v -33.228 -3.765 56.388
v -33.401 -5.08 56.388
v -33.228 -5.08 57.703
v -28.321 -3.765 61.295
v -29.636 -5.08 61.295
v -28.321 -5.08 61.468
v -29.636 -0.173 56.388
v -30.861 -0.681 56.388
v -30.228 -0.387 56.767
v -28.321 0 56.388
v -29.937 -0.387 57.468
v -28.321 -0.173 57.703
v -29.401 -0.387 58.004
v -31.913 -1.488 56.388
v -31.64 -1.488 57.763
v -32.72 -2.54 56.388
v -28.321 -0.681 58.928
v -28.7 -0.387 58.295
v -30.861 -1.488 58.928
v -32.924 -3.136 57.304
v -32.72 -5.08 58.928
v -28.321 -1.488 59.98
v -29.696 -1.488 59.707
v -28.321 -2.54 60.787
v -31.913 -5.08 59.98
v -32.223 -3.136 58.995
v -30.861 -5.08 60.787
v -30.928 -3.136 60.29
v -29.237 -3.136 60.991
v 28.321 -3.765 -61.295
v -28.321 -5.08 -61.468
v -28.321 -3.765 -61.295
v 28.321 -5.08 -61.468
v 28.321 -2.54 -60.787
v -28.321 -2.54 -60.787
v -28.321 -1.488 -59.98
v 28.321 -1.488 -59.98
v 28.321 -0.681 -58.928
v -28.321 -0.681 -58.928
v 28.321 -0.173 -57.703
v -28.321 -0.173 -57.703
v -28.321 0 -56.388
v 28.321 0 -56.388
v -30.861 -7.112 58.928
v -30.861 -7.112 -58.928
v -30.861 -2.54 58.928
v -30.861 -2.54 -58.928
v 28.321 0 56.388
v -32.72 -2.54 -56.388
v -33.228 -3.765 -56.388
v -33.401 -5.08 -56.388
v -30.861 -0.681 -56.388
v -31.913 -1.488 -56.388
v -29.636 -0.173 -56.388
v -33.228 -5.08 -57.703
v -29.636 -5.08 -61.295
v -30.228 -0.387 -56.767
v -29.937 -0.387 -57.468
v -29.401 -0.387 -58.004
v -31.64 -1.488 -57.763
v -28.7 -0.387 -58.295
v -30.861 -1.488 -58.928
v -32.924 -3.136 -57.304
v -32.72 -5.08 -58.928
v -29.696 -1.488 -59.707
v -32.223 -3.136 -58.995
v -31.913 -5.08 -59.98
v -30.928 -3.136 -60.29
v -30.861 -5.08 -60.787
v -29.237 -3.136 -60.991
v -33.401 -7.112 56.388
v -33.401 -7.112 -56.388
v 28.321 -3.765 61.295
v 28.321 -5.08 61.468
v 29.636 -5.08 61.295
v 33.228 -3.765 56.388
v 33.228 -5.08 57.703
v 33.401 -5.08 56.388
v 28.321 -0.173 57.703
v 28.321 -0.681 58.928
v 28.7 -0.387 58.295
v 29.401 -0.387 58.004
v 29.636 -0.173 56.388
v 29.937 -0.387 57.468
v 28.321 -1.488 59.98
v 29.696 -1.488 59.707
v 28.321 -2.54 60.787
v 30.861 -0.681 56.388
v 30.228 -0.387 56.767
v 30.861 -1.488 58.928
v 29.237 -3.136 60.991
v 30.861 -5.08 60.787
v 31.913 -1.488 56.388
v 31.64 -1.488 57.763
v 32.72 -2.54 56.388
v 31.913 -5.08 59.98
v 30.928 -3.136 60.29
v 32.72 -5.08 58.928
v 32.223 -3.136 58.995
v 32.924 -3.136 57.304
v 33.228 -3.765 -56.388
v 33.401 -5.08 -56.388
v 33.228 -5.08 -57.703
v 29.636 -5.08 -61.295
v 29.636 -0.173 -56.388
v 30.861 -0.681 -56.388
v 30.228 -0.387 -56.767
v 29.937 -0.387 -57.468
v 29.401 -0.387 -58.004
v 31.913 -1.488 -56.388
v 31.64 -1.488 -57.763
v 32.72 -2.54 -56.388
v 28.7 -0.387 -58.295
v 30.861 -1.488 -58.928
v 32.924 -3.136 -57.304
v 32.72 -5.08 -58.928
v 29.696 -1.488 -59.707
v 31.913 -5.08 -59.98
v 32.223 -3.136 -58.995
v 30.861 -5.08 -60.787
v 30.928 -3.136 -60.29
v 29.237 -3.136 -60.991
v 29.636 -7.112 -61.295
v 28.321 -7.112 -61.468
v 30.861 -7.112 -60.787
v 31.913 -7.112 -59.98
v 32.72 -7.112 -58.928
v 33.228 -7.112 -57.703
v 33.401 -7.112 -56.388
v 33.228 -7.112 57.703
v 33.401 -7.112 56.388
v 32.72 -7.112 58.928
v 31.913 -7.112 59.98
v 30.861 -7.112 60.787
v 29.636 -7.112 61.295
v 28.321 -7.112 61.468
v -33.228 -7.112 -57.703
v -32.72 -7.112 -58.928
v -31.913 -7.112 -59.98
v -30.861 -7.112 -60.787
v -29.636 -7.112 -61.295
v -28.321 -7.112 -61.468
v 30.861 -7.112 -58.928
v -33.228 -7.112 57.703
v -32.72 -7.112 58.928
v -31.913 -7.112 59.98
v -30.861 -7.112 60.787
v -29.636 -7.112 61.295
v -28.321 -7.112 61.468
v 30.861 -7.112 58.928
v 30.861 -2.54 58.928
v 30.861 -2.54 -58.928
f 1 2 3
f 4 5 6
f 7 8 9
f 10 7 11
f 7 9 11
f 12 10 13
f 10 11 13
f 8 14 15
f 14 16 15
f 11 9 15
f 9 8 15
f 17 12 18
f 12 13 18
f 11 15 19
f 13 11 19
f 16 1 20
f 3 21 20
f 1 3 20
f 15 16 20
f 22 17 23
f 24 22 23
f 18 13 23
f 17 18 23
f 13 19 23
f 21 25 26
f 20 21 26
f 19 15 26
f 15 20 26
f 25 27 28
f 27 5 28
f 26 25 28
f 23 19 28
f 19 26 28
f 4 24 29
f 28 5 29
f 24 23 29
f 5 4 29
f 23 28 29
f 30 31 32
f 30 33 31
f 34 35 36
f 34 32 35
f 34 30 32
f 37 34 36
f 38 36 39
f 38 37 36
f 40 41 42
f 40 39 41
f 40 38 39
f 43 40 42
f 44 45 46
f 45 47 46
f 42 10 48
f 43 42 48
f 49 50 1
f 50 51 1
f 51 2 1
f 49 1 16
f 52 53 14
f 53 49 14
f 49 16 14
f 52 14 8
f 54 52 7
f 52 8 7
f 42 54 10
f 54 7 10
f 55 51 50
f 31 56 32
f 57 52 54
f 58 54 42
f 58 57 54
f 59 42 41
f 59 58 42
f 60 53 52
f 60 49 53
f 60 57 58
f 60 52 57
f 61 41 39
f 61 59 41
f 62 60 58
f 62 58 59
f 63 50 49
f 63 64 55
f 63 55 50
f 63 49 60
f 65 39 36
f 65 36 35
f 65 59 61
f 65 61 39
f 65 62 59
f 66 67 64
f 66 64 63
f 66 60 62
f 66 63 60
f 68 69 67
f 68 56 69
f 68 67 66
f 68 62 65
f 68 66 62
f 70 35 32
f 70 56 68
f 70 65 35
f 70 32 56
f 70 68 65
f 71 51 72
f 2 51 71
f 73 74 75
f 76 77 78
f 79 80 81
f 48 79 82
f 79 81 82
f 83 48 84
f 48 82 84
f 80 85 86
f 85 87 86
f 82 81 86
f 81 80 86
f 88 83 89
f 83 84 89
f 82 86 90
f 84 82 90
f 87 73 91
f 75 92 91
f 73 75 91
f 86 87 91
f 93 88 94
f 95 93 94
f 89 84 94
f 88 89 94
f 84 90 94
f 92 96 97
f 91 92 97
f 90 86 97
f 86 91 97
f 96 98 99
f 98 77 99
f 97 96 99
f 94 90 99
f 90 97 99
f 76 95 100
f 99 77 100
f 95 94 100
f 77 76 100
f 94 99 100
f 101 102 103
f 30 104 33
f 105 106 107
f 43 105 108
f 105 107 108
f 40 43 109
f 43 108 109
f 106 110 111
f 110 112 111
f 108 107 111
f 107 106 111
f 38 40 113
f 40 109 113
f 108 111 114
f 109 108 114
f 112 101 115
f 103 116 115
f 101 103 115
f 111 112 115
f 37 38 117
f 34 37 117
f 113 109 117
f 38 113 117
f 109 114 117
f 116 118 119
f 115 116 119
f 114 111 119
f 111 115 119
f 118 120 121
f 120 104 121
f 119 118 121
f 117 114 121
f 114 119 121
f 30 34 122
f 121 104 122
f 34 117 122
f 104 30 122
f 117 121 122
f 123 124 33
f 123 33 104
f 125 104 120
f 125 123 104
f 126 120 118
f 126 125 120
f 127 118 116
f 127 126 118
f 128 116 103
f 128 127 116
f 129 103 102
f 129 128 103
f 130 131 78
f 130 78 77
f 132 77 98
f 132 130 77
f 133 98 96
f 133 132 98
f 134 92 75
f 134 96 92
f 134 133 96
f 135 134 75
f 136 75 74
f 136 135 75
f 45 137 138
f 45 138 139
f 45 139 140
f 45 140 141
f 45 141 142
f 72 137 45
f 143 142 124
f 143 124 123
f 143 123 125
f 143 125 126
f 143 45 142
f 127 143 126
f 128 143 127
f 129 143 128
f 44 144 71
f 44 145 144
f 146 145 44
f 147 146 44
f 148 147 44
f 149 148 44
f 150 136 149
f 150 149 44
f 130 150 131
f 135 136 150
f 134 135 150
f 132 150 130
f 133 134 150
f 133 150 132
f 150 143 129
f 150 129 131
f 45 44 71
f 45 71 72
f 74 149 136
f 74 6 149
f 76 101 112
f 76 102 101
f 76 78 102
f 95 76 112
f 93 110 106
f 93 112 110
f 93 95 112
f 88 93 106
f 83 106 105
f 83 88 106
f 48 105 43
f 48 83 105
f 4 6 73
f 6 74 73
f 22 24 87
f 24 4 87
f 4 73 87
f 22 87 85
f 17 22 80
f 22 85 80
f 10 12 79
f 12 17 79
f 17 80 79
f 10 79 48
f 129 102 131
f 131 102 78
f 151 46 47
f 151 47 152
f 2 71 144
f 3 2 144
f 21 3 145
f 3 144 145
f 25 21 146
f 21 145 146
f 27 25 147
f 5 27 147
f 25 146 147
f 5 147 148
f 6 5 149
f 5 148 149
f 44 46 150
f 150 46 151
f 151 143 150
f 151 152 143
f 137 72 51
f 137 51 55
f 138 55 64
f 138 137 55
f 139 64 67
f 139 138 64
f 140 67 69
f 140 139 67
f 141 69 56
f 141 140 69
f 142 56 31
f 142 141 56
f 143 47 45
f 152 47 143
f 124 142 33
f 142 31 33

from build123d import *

# Parameters (mm, degrees)
F0_W     = 66.802
F0_H     = 122.936
F1_DEPTH = 7.112
F2_T     = -2.54
F3_R     = 5.08


with BuildPart() as f1:
    # F0 (on Front) → F1 (new body)
    with BuildSketch(Plane.XZ):
        Rectangle(F0_W, F0_H)
    extrude(amount=F1_DEPTH)

    # F2
    f2_openings = [f1.faces().sort_by_distance(p)[0] for p in [
        (0, -7.112, 0),
    ]]
    offset(amount=F2_T, openings=f2_openings)

    # F3
    f3_edges = [f1.edges().sort_by_distance(p)[0] for p in [
        (33.401, -3.556, 61.468),
        (33.401, -3.556, -61.468),
        (-33.401, -3.556, -61.468),
        (-33.401, -3.556, 61.468),
        (-33.401, 0, 0),
        (0, 0, 61.468),
        (33.401, 0, 0),
        (0, 0, -61.468),
    ]]
    fillet(f3_edges, radius=F3_R)


solid = f1.part
